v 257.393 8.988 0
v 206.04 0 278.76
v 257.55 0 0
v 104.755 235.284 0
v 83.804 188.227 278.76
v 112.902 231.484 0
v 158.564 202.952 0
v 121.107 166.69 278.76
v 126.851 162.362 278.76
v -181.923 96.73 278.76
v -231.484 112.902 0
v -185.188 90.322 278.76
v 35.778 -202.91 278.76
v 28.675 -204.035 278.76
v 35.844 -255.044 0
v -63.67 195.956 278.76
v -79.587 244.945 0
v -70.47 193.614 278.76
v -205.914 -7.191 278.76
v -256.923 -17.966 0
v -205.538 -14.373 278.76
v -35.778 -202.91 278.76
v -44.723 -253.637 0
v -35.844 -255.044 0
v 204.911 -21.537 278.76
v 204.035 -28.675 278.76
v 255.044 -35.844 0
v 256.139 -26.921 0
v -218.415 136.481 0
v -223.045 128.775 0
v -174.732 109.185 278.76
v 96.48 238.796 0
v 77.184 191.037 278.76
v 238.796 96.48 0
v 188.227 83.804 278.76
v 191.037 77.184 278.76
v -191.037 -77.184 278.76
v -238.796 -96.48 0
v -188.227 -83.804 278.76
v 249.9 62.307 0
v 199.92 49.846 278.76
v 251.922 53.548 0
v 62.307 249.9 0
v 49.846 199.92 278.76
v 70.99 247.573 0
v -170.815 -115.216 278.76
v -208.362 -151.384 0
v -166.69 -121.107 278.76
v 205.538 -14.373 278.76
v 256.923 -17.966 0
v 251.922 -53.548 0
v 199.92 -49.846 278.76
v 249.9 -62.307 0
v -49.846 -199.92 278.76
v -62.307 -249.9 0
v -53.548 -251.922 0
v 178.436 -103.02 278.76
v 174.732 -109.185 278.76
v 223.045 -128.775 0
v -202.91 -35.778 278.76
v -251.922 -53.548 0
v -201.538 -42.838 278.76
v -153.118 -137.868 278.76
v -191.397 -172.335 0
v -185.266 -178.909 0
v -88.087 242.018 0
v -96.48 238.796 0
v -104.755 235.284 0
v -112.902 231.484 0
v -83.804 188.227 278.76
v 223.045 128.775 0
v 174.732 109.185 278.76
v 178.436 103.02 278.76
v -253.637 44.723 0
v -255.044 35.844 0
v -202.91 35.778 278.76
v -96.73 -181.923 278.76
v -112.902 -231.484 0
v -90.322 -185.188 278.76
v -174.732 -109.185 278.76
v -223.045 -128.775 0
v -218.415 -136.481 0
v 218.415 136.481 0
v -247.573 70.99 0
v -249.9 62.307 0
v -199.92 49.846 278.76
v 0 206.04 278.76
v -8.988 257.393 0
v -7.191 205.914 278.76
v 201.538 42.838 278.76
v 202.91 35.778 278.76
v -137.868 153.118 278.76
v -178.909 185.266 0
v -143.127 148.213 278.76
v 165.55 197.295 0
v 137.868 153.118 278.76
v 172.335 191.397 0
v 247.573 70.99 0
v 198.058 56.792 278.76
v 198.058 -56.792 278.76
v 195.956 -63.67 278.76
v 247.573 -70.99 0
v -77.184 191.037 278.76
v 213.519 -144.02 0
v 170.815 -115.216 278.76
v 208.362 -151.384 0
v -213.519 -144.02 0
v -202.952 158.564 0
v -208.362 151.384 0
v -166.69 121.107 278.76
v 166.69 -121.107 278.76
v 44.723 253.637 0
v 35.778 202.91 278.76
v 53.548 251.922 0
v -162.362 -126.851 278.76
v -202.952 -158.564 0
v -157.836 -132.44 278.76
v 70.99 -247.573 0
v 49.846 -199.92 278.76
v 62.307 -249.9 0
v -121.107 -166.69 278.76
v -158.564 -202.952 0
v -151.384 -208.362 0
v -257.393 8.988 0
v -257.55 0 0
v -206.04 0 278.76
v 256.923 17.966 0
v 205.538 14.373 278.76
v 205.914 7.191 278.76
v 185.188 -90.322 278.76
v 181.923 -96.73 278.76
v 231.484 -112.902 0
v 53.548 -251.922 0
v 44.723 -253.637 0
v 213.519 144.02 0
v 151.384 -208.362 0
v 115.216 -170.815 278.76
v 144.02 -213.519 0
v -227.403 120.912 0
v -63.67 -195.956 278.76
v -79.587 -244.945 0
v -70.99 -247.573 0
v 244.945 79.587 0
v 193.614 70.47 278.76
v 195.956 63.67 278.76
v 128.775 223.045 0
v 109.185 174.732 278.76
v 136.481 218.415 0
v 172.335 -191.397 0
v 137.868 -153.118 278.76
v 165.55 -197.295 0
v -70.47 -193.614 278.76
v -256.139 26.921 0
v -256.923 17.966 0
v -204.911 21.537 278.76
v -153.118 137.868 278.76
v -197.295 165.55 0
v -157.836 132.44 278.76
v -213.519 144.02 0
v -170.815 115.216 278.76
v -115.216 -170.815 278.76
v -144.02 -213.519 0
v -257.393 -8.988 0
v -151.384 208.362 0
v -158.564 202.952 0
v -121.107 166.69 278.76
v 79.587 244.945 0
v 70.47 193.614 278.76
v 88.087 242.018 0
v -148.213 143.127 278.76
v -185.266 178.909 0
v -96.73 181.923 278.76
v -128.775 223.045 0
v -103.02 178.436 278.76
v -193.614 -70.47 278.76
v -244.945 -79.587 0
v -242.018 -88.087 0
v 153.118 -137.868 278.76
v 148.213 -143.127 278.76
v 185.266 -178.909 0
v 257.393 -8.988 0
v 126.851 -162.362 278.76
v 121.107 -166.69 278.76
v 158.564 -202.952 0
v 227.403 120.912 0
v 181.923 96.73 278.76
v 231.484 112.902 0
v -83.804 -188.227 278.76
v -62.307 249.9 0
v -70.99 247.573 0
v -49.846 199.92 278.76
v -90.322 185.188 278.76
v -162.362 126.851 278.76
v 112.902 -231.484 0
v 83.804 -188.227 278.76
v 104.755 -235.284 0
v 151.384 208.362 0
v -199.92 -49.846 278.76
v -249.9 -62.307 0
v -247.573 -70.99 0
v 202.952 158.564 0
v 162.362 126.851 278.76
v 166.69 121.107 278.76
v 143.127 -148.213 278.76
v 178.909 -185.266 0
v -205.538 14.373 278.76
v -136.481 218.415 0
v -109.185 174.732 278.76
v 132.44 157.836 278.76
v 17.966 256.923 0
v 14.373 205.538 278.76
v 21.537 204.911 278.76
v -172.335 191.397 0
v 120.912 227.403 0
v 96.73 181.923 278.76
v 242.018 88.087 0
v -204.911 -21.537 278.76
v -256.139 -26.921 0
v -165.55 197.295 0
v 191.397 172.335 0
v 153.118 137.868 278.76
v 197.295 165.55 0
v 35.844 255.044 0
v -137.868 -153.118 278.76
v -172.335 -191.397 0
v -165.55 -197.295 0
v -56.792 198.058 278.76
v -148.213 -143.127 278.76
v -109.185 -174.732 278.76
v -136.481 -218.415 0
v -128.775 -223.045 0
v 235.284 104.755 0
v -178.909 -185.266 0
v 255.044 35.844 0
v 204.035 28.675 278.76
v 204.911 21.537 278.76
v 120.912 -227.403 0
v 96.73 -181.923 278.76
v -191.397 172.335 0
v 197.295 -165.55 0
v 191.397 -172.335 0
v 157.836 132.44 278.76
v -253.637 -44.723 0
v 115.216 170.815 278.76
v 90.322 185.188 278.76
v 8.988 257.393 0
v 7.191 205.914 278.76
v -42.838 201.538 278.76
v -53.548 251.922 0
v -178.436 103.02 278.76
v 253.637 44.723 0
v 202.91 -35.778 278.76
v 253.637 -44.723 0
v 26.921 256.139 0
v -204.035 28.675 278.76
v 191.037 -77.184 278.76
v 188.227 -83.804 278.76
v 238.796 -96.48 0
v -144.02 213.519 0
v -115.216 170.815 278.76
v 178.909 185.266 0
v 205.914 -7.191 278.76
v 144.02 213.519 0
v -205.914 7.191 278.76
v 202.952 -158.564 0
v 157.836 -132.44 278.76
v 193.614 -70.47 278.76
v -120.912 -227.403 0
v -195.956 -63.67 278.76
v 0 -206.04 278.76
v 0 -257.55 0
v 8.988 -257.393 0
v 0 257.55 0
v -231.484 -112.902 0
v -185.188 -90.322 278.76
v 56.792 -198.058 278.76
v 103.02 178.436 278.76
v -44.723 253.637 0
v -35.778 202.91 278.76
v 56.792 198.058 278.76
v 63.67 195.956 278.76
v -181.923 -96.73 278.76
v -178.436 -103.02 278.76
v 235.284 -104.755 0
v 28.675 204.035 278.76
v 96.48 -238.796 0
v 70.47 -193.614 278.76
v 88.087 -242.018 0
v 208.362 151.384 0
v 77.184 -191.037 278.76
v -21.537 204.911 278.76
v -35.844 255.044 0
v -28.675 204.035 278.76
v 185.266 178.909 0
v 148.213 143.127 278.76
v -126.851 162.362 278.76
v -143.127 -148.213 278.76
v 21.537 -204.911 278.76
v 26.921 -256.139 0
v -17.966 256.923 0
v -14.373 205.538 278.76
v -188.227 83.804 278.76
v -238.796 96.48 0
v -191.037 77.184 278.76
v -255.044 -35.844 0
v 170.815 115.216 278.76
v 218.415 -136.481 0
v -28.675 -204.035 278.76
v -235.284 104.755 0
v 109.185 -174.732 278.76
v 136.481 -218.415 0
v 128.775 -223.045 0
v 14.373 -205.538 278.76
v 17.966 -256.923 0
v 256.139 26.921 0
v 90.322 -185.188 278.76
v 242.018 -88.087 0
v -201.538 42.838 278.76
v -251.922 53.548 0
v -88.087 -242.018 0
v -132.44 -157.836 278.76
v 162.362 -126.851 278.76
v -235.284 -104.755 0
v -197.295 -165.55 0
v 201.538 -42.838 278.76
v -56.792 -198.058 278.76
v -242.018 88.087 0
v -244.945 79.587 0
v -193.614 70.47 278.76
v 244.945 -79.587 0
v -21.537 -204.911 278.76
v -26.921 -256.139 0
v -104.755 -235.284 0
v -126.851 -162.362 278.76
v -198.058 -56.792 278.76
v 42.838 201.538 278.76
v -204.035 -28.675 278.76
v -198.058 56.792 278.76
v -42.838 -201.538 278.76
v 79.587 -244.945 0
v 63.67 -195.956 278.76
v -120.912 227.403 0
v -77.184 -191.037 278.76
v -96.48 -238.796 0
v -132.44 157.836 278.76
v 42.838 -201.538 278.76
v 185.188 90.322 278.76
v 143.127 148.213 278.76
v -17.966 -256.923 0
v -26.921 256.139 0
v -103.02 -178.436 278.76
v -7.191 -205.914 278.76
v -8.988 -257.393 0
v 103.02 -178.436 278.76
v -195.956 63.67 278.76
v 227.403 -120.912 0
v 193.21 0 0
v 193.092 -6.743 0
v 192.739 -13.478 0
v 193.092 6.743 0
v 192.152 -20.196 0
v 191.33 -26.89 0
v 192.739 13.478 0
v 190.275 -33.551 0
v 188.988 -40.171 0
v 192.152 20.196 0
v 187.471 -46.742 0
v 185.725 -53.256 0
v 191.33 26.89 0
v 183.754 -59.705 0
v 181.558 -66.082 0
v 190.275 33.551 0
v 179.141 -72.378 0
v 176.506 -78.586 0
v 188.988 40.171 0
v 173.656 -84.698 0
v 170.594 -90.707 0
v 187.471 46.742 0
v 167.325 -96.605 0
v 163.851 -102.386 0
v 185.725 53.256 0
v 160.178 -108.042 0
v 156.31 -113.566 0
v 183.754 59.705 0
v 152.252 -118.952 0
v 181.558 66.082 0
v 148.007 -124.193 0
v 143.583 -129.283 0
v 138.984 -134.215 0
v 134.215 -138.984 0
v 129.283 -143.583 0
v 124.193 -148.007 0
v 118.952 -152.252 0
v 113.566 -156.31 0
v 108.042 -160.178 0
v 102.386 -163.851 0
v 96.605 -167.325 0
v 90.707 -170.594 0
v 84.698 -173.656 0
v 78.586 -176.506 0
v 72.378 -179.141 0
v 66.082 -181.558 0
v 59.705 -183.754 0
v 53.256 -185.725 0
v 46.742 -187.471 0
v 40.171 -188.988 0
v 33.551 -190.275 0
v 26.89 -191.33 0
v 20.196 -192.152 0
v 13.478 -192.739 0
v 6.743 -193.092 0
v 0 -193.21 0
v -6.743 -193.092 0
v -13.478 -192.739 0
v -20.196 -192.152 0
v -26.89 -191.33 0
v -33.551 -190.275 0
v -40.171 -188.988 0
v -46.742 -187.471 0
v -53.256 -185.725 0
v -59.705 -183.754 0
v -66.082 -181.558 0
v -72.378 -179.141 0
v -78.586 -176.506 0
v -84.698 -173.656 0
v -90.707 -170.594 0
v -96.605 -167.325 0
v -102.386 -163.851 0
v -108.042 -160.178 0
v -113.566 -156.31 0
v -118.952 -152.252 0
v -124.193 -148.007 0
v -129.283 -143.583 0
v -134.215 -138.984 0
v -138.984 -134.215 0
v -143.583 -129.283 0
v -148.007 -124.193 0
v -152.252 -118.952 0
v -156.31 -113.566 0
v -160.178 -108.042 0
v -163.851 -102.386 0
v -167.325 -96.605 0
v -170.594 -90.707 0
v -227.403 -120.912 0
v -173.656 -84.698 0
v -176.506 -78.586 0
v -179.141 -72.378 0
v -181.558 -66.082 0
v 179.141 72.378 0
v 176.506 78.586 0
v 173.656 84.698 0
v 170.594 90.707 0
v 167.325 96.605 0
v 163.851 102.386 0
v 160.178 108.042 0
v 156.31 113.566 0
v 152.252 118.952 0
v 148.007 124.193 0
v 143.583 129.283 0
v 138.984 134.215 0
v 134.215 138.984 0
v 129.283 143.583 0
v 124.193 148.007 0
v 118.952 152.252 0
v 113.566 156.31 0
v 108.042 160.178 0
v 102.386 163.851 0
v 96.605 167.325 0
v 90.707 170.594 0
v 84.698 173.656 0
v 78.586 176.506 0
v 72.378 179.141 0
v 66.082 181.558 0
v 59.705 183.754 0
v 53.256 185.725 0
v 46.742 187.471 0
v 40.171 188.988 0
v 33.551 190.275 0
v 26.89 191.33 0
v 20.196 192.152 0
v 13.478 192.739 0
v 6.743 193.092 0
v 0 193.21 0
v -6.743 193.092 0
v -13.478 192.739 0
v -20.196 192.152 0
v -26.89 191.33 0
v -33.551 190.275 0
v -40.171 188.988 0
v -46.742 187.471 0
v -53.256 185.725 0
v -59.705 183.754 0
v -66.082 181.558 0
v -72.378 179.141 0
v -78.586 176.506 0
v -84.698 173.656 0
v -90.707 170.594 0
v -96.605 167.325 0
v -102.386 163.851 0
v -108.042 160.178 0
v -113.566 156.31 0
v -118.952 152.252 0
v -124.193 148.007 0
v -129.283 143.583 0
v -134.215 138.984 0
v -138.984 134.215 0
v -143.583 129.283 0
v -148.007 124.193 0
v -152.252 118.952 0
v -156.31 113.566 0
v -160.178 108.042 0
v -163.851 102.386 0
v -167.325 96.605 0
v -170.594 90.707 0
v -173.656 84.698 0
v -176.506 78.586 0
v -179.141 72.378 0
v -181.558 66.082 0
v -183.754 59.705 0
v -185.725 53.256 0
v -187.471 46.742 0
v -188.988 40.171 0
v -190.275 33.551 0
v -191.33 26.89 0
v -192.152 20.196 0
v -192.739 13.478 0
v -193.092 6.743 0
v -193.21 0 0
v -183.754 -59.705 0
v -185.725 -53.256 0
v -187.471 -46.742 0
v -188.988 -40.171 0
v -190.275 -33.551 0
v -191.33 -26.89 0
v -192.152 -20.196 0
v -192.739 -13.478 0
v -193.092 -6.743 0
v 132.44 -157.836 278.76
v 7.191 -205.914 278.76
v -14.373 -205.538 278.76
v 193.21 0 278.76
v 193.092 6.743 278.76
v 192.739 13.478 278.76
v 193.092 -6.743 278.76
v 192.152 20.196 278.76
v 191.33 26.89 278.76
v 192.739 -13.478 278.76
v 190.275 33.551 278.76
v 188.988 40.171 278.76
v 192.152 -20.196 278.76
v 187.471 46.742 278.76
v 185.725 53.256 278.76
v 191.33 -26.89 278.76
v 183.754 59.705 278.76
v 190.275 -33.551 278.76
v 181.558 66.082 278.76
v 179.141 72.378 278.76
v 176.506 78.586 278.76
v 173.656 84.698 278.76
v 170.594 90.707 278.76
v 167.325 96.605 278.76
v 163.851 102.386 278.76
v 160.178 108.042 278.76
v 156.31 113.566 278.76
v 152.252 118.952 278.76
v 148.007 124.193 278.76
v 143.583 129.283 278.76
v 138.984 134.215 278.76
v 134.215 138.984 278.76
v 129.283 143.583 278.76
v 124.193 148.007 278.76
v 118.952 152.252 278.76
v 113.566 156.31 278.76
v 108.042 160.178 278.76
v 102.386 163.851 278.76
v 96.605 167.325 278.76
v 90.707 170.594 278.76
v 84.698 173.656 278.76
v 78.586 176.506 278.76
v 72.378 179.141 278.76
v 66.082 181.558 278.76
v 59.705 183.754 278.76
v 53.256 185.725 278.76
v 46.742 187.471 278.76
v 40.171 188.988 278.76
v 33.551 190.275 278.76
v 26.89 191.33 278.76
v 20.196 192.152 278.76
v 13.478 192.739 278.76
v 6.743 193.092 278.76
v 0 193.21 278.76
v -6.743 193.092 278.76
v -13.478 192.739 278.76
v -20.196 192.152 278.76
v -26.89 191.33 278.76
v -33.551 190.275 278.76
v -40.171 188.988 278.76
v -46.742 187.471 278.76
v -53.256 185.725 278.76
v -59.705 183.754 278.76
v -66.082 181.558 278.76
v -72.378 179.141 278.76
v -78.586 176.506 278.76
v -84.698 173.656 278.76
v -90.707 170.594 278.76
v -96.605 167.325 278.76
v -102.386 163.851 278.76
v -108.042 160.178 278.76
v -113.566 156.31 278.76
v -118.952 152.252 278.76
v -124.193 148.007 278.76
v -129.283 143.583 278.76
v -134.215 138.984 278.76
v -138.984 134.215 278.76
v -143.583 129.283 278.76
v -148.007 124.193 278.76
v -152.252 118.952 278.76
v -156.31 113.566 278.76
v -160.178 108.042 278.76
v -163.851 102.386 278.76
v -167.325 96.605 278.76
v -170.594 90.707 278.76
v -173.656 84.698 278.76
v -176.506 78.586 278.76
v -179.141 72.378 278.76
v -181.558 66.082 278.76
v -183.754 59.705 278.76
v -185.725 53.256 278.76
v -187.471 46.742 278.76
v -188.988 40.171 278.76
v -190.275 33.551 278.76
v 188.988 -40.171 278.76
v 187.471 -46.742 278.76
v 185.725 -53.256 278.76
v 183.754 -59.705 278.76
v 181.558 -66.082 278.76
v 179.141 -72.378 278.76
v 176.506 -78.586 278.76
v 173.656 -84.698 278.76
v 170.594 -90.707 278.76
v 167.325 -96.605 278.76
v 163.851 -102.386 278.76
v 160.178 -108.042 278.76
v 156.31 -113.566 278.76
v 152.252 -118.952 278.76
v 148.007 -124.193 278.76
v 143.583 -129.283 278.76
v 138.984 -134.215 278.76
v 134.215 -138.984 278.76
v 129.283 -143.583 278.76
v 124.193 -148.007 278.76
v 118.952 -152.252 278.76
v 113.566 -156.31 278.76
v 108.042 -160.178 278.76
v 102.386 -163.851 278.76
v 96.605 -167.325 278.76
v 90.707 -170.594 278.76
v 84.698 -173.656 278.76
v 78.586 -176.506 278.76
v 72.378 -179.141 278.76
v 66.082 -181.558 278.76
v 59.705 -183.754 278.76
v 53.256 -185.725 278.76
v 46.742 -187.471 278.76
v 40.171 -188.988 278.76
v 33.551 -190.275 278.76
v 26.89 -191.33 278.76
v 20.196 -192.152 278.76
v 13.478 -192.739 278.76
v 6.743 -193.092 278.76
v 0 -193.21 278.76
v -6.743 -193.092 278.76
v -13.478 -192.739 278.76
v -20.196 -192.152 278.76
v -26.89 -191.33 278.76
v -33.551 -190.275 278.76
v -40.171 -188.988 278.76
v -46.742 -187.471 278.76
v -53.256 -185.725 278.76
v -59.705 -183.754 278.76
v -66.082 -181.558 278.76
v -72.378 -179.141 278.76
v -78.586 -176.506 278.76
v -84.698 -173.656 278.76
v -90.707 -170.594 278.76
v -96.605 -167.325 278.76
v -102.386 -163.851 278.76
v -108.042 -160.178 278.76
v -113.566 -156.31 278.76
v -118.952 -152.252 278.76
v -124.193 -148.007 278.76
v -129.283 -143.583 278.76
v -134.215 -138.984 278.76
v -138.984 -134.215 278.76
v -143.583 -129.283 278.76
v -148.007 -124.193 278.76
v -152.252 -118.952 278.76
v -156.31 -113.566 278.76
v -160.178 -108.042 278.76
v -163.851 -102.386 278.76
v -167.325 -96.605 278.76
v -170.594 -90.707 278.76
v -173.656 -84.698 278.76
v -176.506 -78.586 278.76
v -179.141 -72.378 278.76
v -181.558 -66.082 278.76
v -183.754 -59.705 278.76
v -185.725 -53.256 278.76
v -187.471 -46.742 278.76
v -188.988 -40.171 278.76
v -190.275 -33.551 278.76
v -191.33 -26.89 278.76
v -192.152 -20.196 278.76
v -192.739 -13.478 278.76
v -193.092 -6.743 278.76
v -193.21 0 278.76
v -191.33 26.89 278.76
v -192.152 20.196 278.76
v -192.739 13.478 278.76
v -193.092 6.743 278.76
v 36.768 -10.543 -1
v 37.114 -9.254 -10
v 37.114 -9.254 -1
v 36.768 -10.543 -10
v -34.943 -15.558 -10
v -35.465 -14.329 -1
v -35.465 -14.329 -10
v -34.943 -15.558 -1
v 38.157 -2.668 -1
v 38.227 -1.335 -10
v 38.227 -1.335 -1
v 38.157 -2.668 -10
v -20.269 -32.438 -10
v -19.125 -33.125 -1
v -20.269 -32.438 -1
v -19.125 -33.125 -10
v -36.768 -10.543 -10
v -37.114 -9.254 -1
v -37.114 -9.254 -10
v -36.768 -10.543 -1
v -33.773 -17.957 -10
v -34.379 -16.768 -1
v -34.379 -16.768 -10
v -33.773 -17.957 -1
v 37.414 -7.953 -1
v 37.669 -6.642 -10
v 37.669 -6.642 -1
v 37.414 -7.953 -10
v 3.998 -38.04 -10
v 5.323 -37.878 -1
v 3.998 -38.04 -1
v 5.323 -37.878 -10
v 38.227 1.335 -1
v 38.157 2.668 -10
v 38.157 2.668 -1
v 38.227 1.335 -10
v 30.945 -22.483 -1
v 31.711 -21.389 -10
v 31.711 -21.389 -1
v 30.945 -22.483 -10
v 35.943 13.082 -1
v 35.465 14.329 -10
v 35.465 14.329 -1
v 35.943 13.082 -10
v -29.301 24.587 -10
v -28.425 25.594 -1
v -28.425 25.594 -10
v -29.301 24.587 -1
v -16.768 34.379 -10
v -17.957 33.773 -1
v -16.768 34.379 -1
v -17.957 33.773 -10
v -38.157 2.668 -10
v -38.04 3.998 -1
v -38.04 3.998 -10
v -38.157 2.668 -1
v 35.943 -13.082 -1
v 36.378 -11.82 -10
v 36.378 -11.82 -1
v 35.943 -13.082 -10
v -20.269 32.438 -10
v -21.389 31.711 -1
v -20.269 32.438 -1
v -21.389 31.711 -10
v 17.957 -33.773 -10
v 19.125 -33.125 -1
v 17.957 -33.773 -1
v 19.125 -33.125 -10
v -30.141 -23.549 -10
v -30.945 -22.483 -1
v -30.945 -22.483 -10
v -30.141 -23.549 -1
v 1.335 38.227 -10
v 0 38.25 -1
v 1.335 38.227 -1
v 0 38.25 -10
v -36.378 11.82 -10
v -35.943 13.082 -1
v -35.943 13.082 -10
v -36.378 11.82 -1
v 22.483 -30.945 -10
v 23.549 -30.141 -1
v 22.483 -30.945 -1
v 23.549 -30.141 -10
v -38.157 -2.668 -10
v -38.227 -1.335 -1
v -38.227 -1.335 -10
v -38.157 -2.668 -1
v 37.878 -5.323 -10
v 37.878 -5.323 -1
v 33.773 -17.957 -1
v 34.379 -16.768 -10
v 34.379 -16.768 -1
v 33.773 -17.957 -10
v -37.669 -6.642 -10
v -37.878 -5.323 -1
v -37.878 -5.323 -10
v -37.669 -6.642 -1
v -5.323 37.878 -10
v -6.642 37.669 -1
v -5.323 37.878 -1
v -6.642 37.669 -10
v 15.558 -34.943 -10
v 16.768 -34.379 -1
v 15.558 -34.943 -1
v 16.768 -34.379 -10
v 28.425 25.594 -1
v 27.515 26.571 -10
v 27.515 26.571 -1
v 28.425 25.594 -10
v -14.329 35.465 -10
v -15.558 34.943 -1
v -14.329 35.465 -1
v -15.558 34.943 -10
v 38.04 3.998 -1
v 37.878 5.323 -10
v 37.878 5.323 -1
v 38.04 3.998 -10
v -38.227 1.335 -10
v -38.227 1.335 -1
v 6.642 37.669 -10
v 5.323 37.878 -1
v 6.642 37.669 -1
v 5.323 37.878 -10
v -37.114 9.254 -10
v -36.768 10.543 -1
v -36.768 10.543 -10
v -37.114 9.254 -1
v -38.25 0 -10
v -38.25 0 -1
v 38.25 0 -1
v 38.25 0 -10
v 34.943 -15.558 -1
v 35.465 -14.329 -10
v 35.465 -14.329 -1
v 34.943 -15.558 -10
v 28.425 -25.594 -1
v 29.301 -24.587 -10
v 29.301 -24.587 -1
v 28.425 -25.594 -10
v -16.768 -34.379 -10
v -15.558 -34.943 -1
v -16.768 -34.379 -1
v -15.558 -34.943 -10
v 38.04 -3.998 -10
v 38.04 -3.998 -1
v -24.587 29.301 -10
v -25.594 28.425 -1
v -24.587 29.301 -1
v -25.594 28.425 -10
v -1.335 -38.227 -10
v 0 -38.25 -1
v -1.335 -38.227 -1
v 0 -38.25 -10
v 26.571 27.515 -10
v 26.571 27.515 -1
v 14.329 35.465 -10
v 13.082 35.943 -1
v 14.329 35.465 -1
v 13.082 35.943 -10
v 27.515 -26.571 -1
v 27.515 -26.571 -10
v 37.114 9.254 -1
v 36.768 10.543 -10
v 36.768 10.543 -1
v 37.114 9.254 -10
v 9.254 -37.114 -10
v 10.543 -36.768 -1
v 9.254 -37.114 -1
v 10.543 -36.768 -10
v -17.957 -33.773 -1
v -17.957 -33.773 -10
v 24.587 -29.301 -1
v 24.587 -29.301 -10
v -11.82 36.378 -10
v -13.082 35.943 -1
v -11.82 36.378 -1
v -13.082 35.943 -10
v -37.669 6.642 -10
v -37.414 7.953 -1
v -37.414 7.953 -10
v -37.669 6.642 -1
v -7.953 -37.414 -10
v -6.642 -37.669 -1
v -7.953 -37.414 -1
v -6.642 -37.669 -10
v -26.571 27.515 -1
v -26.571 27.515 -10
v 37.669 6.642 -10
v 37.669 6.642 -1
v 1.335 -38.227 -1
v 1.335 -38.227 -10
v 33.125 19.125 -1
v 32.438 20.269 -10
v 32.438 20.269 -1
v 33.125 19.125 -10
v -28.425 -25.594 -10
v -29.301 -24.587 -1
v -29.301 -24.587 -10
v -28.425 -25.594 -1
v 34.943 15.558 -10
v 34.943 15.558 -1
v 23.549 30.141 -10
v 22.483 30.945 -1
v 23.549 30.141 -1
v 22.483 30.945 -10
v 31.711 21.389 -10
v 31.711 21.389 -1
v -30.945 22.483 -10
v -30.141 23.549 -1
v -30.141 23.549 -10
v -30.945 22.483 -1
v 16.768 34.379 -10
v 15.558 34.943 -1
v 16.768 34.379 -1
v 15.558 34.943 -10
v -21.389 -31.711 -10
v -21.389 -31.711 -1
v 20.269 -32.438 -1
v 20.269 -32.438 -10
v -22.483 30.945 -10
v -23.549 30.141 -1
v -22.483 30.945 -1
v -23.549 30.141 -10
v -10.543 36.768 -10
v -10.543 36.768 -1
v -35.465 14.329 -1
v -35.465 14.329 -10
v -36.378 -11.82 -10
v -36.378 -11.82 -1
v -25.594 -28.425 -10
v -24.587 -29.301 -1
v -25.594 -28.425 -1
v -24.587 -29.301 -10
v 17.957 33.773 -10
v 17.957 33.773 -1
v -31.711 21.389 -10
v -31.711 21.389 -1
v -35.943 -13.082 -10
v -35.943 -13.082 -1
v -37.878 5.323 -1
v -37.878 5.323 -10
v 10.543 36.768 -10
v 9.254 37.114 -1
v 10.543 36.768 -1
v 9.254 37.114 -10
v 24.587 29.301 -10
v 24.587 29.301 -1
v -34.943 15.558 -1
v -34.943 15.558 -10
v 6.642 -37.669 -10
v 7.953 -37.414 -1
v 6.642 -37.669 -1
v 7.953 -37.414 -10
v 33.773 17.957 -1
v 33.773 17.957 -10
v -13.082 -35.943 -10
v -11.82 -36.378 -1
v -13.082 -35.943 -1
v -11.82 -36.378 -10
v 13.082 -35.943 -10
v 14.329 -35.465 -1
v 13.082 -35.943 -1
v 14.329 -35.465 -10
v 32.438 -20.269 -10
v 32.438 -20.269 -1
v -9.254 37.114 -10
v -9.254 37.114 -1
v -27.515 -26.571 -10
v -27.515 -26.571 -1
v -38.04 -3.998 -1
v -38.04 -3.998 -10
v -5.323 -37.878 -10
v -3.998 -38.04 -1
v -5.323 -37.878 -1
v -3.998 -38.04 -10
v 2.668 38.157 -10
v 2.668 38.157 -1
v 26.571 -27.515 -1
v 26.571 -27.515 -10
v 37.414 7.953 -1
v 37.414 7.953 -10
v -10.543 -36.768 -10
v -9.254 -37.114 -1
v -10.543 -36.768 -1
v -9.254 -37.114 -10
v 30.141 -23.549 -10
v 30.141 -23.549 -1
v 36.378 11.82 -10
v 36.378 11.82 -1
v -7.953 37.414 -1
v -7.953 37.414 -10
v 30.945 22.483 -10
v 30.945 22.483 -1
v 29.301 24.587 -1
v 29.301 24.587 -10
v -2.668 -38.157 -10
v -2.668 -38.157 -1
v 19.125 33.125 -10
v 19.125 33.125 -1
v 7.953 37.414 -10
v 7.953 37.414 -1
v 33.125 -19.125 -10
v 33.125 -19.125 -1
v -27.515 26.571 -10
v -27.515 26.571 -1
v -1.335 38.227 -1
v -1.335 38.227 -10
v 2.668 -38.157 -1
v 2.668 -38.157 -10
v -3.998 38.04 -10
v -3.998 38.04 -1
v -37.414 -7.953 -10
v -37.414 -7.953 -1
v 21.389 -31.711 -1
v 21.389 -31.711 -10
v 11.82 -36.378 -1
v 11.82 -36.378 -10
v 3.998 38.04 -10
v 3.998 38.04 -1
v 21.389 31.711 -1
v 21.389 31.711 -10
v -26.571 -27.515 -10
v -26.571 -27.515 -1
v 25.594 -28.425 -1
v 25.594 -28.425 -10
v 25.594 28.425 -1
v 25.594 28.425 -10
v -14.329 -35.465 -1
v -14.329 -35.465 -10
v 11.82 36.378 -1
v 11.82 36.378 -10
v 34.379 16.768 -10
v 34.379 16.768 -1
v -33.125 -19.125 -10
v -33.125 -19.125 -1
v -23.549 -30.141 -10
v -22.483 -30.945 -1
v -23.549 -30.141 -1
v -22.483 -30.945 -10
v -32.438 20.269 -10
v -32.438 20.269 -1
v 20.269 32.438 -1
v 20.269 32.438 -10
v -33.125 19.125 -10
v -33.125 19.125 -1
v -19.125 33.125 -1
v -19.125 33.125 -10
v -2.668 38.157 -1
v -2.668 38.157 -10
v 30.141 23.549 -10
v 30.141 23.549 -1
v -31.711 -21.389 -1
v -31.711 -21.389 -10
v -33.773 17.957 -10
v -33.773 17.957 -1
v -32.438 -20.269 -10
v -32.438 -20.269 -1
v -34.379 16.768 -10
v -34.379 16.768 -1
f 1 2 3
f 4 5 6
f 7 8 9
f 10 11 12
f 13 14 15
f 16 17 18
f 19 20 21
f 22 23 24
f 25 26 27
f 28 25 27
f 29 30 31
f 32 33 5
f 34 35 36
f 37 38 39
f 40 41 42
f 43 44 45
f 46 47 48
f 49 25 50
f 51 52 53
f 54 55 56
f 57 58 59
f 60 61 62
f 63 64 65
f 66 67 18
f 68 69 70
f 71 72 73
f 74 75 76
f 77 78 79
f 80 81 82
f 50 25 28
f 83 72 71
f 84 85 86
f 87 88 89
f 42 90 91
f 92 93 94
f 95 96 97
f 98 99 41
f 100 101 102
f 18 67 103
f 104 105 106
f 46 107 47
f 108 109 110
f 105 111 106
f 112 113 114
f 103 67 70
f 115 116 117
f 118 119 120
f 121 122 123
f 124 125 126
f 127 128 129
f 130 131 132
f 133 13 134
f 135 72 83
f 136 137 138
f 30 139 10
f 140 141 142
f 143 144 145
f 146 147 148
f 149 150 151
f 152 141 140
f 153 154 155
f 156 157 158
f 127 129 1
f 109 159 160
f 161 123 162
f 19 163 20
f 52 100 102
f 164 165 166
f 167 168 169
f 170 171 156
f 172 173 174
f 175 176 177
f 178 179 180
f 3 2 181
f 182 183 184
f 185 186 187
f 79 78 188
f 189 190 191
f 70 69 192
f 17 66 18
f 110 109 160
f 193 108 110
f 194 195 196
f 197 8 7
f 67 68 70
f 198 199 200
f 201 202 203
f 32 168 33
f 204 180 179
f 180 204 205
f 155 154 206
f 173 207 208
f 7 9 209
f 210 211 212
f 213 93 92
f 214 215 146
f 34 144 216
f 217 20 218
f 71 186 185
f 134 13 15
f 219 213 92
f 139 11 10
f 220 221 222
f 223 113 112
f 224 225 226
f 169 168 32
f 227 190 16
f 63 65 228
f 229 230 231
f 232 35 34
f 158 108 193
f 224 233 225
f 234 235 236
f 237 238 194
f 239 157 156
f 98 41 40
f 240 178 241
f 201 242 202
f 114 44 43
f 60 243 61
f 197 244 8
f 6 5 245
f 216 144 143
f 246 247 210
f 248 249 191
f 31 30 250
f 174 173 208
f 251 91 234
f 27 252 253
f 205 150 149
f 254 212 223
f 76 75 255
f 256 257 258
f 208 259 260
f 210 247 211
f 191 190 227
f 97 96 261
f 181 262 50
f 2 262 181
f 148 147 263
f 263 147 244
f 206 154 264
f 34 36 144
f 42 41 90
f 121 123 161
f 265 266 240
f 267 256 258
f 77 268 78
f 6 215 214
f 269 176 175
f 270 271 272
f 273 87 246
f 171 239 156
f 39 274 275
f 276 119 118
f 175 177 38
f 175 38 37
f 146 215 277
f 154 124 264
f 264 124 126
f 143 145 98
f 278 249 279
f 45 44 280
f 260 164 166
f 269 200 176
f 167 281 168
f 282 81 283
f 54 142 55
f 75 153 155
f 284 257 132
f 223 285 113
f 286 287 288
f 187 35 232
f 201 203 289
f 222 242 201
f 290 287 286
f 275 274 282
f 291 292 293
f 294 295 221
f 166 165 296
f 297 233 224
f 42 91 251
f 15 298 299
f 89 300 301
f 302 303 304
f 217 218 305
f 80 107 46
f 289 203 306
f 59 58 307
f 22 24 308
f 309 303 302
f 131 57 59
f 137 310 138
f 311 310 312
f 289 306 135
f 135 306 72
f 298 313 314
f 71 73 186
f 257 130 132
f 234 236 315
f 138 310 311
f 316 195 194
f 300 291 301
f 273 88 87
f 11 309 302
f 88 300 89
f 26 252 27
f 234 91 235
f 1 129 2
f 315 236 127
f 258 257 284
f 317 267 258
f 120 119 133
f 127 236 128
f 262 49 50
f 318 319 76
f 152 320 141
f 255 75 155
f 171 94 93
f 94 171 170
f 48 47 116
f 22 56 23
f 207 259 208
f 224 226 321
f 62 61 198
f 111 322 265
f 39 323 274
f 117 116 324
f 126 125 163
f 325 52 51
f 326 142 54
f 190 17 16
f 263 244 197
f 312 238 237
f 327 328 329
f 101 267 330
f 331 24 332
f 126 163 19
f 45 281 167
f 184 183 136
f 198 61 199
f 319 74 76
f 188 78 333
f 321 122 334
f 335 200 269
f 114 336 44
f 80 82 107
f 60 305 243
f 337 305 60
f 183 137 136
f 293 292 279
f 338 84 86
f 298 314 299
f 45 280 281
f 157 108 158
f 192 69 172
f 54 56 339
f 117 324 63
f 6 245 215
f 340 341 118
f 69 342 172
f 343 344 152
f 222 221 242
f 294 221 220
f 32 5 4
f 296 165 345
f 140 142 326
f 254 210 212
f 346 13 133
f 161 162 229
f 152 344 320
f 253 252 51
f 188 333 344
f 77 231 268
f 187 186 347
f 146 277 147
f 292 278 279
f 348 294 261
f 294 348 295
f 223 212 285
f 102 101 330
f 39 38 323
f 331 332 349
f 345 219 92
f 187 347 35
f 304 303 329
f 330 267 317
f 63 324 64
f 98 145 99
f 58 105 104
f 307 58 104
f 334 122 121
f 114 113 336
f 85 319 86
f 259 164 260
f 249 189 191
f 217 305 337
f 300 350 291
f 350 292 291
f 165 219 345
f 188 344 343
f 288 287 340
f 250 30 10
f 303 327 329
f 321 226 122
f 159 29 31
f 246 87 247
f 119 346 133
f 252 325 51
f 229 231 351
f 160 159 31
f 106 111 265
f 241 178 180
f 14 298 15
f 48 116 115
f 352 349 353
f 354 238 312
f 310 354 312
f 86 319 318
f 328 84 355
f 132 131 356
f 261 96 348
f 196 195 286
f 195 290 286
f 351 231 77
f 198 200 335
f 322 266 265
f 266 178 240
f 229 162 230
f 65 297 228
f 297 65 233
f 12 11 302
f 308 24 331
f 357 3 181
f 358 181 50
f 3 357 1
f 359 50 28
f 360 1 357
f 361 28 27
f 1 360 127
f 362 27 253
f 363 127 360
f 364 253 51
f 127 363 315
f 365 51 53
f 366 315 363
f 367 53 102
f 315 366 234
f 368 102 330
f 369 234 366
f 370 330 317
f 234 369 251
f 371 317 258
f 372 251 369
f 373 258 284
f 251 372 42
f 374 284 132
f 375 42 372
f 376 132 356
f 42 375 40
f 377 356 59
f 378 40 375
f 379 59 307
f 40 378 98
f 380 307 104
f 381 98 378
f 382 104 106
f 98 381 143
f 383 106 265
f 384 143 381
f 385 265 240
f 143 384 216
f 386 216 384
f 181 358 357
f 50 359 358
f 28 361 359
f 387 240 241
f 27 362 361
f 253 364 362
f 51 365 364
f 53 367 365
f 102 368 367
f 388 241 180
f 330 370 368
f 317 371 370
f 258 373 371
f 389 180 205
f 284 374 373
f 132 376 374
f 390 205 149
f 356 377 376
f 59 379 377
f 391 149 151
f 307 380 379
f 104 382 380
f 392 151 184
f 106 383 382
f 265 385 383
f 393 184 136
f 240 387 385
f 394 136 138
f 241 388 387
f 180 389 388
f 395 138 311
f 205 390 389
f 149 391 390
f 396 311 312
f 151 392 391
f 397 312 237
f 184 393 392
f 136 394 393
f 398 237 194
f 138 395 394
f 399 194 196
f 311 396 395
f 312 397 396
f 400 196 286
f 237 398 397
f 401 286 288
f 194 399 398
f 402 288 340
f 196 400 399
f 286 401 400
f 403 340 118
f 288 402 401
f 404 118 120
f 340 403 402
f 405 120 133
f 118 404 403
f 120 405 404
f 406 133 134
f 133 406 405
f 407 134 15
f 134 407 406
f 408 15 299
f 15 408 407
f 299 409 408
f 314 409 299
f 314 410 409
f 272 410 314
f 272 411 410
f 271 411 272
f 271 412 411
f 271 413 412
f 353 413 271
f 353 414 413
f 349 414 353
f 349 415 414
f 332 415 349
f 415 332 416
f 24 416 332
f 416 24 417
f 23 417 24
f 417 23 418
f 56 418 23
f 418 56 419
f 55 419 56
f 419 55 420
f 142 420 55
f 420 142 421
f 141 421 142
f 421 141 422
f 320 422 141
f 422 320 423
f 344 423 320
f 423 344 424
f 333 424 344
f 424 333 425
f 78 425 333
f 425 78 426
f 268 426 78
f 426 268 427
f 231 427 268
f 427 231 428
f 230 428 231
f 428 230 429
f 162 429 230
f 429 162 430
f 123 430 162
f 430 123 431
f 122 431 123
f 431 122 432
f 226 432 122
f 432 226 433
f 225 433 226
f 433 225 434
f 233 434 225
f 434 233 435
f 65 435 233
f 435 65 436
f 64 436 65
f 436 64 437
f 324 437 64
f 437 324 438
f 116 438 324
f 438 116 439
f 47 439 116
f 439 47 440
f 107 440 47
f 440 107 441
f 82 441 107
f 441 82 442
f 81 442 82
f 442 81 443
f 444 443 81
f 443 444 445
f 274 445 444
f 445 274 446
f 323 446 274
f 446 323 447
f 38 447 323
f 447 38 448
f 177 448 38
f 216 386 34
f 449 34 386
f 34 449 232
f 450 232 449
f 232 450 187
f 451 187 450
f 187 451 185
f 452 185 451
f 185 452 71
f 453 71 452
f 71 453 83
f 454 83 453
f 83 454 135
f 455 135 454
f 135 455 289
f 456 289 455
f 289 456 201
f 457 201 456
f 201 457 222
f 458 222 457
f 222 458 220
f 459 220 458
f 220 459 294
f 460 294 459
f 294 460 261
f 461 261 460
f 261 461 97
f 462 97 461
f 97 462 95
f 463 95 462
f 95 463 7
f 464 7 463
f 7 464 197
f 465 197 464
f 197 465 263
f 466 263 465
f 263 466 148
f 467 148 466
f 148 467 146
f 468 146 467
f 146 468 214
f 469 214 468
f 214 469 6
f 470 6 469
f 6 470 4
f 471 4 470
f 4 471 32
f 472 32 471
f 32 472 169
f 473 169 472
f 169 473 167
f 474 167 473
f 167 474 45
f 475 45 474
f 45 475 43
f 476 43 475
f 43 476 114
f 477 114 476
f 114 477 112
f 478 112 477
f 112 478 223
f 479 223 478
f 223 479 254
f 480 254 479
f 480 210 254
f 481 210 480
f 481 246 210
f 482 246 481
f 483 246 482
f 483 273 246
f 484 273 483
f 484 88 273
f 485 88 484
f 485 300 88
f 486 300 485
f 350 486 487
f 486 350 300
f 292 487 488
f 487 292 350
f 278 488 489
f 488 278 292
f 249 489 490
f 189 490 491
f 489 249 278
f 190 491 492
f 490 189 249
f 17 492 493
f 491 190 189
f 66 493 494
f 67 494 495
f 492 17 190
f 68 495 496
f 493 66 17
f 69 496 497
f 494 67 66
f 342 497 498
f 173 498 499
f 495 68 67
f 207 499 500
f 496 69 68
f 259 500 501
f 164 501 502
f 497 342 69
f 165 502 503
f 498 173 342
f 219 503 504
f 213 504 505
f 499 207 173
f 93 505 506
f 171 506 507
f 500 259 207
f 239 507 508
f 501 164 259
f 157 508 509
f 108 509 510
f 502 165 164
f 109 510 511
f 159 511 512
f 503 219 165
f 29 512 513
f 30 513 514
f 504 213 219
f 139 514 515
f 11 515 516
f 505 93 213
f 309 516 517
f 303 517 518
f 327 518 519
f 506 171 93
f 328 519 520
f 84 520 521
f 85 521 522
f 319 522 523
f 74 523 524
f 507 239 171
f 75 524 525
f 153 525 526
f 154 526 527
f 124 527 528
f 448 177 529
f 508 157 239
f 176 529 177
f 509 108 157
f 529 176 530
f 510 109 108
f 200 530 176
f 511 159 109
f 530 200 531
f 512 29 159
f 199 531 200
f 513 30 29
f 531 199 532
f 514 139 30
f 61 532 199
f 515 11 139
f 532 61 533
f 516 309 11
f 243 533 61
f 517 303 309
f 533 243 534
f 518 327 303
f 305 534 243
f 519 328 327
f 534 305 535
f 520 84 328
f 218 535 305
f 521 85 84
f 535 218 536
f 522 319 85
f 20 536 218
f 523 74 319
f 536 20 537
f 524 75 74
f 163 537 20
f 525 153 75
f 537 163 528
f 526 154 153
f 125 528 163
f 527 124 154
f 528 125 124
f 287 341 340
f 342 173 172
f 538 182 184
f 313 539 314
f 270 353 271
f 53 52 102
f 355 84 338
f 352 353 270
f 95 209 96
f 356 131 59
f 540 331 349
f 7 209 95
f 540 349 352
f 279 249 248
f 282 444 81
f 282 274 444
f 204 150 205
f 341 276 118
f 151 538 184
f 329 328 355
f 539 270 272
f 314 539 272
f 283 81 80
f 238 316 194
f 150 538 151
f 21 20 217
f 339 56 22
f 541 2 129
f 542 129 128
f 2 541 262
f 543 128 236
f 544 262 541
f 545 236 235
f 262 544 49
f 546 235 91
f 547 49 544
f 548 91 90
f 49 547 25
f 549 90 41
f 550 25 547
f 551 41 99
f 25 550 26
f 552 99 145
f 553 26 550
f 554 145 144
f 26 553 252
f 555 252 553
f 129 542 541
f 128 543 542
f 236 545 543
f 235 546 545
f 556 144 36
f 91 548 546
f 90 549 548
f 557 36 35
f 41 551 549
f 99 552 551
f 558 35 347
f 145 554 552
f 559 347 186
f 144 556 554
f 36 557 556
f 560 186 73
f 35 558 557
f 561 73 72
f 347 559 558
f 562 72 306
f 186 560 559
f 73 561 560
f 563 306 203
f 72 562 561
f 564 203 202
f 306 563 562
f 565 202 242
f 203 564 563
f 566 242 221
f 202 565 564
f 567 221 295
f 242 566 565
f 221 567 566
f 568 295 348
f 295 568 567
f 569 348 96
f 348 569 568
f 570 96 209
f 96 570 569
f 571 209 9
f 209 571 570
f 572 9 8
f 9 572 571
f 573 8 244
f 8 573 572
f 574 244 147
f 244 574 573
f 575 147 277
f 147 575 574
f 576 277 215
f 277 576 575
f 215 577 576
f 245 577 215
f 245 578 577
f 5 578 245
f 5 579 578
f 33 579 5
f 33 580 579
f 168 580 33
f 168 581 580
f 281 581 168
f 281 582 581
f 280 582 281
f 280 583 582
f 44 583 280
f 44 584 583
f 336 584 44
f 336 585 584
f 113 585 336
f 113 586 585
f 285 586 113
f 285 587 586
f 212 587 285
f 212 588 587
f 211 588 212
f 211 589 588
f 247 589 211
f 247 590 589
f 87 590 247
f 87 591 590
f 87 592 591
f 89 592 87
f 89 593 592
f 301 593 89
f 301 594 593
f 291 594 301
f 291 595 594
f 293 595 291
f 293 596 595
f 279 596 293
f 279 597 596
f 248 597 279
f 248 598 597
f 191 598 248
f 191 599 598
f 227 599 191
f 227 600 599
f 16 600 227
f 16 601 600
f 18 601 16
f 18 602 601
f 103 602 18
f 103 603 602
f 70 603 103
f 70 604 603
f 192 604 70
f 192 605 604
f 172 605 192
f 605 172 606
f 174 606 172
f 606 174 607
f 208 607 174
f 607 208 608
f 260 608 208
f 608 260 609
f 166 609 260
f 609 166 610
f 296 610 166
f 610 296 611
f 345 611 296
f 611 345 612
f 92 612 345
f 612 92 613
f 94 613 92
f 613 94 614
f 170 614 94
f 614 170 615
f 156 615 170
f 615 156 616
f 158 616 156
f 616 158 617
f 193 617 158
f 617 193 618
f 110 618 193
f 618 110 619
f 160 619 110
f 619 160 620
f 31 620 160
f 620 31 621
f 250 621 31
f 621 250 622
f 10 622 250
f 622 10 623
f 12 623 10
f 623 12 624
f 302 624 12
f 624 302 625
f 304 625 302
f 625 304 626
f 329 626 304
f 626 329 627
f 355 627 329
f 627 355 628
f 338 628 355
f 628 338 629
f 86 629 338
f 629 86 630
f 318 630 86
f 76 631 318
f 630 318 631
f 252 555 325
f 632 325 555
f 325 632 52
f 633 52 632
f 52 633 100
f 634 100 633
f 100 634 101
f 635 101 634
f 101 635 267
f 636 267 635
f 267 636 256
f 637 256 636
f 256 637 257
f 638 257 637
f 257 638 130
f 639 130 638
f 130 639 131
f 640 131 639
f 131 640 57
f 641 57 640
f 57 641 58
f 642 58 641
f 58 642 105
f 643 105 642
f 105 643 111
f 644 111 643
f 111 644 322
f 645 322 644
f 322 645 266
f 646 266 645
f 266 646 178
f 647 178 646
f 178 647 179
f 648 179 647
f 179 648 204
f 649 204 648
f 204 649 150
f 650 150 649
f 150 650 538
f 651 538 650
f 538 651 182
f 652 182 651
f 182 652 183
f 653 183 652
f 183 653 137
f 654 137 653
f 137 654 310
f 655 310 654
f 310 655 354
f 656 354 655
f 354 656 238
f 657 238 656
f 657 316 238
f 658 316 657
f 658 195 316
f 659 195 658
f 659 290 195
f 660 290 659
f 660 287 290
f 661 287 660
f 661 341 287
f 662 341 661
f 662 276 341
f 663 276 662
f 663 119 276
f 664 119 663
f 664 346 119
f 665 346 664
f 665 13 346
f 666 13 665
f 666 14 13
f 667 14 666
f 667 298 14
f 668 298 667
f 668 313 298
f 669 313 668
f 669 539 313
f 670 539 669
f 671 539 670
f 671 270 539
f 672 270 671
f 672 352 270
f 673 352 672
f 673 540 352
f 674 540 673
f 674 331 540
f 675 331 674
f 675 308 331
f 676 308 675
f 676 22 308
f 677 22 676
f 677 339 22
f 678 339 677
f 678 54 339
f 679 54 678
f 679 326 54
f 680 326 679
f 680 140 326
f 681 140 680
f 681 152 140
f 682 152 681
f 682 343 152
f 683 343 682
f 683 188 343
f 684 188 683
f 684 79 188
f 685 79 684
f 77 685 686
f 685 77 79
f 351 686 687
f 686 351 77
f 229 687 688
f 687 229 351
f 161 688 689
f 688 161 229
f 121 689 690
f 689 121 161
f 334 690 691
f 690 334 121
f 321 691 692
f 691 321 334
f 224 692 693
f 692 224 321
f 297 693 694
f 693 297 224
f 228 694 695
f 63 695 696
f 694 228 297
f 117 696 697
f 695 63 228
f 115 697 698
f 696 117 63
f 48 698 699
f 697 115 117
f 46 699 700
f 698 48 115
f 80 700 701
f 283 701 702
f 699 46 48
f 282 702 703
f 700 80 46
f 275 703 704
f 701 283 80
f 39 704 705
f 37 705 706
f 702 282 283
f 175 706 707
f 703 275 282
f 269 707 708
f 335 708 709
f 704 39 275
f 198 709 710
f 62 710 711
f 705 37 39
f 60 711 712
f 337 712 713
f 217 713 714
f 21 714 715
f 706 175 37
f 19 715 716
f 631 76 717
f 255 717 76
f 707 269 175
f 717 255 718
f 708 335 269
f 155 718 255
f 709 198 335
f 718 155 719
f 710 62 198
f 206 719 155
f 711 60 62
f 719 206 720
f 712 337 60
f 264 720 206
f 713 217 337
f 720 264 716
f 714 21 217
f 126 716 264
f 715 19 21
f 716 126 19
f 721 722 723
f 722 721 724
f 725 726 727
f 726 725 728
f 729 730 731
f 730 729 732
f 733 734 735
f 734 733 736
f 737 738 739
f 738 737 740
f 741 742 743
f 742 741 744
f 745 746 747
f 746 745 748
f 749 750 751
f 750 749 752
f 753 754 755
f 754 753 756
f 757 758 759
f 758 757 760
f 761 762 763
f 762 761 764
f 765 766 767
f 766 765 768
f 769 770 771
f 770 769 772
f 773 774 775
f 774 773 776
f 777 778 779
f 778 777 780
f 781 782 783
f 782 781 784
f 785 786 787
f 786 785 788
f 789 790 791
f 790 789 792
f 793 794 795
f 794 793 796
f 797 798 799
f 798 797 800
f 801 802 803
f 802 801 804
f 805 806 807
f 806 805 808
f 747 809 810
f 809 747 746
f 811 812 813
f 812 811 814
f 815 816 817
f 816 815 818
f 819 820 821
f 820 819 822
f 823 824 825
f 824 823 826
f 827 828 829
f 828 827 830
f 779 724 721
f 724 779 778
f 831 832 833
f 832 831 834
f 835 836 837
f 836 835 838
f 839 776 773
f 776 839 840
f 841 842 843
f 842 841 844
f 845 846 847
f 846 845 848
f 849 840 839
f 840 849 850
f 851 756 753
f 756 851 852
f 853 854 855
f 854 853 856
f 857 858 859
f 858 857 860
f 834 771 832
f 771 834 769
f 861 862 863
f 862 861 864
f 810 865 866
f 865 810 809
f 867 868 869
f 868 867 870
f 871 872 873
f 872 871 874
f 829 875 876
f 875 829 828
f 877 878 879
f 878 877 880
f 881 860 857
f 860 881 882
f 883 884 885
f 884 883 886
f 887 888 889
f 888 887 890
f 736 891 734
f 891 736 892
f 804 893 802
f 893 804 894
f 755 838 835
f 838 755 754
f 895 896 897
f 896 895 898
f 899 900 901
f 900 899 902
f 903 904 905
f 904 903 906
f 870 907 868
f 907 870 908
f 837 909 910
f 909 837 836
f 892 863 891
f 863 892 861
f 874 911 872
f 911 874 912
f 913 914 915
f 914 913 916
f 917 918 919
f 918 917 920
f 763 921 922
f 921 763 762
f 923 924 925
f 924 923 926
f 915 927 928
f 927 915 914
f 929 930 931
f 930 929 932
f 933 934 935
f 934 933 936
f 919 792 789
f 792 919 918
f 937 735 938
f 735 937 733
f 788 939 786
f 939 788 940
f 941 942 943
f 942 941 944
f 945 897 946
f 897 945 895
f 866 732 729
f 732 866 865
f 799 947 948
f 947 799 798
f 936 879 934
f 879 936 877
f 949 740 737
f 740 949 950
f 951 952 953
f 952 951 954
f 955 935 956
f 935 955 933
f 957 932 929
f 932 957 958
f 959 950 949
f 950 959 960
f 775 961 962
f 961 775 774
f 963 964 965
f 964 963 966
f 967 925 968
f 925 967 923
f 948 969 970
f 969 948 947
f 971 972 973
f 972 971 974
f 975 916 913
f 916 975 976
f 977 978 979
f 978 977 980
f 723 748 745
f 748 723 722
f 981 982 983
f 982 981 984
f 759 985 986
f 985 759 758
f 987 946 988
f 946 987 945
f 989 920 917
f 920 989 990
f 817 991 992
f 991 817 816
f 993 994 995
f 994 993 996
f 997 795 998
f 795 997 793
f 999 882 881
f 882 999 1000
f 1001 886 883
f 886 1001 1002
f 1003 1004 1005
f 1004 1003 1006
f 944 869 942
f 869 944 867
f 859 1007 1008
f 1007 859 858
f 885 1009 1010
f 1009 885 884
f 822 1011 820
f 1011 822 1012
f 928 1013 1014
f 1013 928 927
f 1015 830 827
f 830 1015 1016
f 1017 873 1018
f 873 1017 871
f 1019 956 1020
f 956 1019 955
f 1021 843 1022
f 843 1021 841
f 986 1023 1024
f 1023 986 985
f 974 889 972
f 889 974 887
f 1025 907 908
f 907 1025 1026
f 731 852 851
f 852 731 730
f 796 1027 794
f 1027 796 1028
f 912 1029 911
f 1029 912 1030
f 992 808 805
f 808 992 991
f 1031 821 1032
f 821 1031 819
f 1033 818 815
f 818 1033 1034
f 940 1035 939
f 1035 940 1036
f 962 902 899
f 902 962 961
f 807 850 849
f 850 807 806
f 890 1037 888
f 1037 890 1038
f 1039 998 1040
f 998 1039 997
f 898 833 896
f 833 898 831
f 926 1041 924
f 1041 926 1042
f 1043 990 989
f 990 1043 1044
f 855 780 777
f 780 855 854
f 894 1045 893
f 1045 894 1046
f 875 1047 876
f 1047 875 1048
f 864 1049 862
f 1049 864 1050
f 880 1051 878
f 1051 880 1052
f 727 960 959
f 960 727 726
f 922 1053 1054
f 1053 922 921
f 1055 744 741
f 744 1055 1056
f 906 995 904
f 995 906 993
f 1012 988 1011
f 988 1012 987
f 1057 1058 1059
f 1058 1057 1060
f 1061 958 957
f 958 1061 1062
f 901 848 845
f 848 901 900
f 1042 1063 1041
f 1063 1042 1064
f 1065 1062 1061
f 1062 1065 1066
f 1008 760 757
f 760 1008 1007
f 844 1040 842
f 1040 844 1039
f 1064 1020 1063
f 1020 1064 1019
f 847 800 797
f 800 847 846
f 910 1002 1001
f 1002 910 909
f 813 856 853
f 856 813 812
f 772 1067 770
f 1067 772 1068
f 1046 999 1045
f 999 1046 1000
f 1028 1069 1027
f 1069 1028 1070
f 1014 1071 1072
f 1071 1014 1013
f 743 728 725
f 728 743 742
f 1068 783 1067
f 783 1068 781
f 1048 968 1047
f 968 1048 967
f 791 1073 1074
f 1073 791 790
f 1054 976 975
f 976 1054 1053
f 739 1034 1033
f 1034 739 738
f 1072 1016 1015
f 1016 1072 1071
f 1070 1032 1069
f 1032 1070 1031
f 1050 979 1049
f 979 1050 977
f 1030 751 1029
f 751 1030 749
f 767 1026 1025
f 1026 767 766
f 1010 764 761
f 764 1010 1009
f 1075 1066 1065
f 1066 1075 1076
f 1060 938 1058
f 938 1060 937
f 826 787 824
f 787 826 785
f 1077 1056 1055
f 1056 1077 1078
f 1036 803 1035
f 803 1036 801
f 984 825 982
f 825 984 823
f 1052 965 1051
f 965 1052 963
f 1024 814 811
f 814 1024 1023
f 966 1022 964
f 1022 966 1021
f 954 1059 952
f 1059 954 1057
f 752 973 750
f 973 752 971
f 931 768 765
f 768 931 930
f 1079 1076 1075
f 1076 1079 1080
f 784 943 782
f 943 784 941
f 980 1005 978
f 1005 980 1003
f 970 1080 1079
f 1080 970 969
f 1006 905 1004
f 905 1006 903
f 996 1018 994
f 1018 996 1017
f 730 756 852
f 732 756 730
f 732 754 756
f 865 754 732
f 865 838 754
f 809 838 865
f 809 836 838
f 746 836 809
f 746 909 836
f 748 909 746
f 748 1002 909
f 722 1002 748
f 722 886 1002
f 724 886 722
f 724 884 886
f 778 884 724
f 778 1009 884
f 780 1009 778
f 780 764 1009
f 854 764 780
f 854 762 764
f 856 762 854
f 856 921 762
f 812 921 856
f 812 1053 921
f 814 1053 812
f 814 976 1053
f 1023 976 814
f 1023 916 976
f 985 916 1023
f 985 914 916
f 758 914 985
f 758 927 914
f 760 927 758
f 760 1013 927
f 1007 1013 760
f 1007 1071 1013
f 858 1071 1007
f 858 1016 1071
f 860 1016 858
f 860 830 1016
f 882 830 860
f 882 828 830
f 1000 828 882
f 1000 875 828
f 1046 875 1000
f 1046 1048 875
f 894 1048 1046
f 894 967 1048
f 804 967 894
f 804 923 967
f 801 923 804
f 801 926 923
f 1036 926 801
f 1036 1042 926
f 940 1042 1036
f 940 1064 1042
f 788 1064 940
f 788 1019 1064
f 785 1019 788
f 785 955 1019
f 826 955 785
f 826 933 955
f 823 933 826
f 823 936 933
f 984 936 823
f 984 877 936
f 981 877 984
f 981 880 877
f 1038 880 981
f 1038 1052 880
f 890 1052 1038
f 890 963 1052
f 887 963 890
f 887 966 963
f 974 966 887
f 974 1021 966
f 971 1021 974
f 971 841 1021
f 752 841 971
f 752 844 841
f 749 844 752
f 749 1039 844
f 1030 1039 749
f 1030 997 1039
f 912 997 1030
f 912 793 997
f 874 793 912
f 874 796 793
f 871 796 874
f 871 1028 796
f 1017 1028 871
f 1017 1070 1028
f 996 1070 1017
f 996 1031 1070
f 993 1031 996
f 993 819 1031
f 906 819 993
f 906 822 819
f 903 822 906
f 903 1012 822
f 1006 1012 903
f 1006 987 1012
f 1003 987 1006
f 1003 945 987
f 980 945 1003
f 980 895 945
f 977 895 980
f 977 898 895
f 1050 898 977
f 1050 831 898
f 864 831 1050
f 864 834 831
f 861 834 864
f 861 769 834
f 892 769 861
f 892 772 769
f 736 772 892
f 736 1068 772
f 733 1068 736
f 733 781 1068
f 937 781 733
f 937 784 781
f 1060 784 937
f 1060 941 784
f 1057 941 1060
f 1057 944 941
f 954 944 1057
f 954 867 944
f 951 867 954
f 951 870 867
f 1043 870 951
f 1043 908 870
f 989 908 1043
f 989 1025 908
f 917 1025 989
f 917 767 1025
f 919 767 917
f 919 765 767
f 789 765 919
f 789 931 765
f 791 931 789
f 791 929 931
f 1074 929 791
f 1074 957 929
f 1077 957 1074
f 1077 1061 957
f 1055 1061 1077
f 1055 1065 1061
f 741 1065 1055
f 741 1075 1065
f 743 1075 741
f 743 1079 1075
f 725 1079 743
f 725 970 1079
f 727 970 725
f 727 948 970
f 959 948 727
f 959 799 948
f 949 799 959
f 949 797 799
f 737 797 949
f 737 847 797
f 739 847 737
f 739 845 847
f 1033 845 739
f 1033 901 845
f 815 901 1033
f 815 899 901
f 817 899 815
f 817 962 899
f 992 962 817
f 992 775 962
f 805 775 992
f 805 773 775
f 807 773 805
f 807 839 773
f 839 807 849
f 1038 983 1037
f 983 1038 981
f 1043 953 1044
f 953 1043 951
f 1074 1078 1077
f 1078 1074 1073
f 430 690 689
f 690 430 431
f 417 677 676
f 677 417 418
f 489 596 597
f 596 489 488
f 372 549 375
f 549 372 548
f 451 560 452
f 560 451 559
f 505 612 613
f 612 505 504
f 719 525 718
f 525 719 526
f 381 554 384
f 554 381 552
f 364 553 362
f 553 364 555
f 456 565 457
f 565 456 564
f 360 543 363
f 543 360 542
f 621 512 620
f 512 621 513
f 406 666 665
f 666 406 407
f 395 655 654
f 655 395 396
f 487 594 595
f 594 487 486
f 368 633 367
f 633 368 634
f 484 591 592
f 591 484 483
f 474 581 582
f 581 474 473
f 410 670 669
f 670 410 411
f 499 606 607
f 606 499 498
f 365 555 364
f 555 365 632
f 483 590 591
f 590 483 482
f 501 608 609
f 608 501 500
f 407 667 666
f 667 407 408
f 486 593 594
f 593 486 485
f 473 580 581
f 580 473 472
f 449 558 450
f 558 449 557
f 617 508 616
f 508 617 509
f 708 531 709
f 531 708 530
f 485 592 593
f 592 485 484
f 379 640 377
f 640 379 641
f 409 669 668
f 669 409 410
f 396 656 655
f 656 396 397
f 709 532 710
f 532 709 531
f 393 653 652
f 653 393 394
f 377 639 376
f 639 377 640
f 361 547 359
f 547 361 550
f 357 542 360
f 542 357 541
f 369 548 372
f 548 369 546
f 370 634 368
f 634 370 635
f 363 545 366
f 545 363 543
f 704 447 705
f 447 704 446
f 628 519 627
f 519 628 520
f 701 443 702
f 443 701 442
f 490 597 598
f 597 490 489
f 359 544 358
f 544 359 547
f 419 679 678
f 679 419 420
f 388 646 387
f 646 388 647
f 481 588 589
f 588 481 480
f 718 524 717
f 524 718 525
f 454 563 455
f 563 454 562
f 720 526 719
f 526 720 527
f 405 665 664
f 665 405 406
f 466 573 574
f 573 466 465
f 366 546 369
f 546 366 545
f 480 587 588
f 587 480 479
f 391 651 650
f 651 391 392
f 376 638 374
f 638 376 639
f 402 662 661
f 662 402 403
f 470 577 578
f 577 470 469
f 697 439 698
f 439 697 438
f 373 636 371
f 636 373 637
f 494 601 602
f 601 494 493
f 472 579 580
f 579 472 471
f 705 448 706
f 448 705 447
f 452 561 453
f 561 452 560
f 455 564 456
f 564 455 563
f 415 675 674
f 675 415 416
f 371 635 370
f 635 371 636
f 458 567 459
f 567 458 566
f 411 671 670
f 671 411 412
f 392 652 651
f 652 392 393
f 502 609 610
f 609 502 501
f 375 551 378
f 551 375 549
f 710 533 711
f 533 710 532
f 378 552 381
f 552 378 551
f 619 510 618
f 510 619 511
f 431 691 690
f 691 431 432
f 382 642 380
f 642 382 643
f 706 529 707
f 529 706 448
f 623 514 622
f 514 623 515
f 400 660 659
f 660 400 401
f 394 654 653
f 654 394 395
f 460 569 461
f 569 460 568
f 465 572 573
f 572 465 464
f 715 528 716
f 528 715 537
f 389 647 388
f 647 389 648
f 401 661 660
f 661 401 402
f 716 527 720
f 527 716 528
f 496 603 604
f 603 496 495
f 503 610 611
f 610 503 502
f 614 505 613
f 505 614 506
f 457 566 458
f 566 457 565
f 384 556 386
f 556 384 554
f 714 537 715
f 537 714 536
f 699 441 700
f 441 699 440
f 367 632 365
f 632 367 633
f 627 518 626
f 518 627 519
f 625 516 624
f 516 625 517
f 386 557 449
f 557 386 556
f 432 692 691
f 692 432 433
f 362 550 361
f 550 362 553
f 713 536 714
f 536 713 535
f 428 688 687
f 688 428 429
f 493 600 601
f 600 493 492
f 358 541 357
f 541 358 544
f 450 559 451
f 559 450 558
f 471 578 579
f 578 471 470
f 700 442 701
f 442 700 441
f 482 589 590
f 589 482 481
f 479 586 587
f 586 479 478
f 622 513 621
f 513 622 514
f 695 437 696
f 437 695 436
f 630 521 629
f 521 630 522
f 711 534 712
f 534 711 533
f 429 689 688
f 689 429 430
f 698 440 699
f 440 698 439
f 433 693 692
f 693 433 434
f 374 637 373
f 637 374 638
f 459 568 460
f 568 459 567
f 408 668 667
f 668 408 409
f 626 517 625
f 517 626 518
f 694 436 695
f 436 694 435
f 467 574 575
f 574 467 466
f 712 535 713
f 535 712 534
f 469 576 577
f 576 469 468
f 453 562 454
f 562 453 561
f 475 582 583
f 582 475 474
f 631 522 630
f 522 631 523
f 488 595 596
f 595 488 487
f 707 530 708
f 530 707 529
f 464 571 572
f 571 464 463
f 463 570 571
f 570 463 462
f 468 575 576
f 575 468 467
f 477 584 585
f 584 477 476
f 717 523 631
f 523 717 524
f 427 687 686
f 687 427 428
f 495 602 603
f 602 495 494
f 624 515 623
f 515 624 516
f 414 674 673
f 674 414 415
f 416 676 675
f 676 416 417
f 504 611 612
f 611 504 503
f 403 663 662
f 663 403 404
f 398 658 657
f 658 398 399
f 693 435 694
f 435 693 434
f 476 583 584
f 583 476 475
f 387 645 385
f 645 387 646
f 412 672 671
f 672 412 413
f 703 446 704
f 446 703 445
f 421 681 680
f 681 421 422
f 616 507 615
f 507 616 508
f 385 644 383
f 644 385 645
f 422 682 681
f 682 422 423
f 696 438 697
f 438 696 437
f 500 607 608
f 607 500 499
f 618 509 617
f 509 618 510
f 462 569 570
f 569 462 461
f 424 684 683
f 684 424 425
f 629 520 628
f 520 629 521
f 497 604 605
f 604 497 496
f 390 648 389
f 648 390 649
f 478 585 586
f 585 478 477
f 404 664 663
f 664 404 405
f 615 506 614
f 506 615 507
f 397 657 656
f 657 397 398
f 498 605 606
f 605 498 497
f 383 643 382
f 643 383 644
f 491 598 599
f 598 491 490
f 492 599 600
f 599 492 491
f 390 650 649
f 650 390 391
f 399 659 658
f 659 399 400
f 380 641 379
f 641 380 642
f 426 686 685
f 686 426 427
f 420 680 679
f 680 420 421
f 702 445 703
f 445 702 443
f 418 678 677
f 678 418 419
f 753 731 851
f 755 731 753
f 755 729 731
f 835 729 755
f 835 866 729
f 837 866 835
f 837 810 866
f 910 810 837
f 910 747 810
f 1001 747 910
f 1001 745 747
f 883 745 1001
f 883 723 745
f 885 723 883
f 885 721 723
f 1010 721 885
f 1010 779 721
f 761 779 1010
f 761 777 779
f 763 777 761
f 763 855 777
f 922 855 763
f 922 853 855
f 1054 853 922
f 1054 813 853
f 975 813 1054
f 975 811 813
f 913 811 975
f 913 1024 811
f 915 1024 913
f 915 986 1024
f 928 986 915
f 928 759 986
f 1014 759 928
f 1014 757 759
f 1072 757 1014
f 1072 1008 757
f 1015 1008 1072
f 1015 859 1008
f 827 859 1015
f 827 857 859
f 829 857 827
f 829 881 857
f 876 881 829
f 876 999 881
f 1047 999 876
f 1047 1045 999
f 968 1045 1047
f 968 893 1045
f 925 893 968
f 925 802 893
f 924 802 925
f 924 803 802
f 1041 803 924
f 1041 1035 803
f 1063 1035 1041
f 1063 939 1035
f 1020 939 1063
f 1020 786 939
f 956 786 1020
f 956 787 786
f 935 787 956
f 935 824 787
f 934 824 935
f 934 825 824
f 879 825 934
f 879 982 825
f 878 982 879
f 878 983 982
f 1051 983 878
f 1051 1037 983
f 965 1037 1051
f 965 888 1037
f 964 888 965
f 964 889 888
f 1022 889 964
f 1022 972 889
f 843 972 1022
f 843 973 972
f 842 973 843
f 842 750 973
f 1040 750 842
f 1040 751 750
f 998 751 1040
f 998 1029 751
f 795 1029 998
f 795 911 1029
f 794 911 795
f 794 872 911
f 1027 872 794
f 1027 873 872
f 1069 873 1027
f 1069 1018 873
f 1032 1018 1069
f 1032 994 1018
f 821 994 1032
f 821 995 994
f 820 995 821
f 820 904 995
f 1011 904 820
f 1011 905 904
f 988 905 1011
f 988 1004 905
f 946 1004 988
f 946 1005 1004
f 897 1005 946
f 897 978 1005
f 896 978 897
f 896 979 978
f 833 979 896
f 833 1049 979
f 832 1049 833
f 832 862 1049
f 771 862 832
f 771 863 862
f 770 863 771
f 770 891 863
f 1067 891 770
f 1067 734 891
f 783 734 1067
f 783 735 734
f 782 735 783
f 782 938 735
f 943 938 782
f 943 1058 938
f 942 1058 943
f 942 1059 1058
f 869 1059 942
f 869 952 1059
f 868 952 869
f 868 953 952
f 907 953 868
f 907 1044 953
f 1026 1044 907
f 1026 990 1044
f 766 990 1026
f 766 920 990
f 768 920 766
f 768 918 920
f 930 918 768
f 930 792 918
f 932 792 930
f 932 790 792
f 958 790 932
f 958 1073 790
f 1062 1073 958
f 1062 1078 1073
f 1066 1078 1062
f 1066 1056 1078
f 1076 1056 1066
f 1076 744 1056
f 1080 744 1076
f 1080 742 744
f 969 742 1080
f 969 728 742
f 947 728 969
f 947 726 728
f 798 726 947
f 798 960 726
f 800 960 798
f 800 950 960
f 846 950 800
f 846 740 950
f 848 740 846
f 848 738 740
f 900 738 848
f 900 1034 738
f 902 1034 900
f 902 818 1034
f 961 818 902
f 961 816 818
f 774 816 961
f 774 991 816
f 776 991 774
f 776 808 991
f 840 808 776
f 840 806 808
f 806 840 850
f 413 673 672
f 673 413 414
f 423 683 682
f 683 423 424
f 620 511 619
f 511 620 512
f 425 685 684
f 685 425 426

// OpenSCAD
FN=30;
FN_pod=180;

pod_outer = 					89.33;
pod_wall_inner = 			76.5;
pod_wall_thickness =		pod_outer - pod_wall_inner;

muzzle_r_first_step =		515.1 / 2;
muzzle_r_final_step =		412.08 / 2 ;
muzzle_h_first_to_final =	557.52 / 2;
muzzle_r_inner =			muzzle_r_final_step - (2 * pod_wall_thickness);




	difference() {
		union()	{
			translate()
				color("grey") 
				cylinder(r1=muzzle_r_first_step, r2=muzzle_r_final_step, 
							h=muzzle_h_first_to_final,
							center=false, $fn=FN_pod);
			translate([0,0,-10])
			color("red")
				cylinder(r=pod_wall_inner/2, 
							h=muzzle_h_first_to_final,
							center=false, $fn=FN_pod);
		
	
		}
	

		translate([0,0,-1])
			cylinder(r=muzzle_r_final_step - pod_wall_thickness, 
						h=muzzle_h_first_to_final+2, 
						center=false, $fn=FN_pod);
	}
